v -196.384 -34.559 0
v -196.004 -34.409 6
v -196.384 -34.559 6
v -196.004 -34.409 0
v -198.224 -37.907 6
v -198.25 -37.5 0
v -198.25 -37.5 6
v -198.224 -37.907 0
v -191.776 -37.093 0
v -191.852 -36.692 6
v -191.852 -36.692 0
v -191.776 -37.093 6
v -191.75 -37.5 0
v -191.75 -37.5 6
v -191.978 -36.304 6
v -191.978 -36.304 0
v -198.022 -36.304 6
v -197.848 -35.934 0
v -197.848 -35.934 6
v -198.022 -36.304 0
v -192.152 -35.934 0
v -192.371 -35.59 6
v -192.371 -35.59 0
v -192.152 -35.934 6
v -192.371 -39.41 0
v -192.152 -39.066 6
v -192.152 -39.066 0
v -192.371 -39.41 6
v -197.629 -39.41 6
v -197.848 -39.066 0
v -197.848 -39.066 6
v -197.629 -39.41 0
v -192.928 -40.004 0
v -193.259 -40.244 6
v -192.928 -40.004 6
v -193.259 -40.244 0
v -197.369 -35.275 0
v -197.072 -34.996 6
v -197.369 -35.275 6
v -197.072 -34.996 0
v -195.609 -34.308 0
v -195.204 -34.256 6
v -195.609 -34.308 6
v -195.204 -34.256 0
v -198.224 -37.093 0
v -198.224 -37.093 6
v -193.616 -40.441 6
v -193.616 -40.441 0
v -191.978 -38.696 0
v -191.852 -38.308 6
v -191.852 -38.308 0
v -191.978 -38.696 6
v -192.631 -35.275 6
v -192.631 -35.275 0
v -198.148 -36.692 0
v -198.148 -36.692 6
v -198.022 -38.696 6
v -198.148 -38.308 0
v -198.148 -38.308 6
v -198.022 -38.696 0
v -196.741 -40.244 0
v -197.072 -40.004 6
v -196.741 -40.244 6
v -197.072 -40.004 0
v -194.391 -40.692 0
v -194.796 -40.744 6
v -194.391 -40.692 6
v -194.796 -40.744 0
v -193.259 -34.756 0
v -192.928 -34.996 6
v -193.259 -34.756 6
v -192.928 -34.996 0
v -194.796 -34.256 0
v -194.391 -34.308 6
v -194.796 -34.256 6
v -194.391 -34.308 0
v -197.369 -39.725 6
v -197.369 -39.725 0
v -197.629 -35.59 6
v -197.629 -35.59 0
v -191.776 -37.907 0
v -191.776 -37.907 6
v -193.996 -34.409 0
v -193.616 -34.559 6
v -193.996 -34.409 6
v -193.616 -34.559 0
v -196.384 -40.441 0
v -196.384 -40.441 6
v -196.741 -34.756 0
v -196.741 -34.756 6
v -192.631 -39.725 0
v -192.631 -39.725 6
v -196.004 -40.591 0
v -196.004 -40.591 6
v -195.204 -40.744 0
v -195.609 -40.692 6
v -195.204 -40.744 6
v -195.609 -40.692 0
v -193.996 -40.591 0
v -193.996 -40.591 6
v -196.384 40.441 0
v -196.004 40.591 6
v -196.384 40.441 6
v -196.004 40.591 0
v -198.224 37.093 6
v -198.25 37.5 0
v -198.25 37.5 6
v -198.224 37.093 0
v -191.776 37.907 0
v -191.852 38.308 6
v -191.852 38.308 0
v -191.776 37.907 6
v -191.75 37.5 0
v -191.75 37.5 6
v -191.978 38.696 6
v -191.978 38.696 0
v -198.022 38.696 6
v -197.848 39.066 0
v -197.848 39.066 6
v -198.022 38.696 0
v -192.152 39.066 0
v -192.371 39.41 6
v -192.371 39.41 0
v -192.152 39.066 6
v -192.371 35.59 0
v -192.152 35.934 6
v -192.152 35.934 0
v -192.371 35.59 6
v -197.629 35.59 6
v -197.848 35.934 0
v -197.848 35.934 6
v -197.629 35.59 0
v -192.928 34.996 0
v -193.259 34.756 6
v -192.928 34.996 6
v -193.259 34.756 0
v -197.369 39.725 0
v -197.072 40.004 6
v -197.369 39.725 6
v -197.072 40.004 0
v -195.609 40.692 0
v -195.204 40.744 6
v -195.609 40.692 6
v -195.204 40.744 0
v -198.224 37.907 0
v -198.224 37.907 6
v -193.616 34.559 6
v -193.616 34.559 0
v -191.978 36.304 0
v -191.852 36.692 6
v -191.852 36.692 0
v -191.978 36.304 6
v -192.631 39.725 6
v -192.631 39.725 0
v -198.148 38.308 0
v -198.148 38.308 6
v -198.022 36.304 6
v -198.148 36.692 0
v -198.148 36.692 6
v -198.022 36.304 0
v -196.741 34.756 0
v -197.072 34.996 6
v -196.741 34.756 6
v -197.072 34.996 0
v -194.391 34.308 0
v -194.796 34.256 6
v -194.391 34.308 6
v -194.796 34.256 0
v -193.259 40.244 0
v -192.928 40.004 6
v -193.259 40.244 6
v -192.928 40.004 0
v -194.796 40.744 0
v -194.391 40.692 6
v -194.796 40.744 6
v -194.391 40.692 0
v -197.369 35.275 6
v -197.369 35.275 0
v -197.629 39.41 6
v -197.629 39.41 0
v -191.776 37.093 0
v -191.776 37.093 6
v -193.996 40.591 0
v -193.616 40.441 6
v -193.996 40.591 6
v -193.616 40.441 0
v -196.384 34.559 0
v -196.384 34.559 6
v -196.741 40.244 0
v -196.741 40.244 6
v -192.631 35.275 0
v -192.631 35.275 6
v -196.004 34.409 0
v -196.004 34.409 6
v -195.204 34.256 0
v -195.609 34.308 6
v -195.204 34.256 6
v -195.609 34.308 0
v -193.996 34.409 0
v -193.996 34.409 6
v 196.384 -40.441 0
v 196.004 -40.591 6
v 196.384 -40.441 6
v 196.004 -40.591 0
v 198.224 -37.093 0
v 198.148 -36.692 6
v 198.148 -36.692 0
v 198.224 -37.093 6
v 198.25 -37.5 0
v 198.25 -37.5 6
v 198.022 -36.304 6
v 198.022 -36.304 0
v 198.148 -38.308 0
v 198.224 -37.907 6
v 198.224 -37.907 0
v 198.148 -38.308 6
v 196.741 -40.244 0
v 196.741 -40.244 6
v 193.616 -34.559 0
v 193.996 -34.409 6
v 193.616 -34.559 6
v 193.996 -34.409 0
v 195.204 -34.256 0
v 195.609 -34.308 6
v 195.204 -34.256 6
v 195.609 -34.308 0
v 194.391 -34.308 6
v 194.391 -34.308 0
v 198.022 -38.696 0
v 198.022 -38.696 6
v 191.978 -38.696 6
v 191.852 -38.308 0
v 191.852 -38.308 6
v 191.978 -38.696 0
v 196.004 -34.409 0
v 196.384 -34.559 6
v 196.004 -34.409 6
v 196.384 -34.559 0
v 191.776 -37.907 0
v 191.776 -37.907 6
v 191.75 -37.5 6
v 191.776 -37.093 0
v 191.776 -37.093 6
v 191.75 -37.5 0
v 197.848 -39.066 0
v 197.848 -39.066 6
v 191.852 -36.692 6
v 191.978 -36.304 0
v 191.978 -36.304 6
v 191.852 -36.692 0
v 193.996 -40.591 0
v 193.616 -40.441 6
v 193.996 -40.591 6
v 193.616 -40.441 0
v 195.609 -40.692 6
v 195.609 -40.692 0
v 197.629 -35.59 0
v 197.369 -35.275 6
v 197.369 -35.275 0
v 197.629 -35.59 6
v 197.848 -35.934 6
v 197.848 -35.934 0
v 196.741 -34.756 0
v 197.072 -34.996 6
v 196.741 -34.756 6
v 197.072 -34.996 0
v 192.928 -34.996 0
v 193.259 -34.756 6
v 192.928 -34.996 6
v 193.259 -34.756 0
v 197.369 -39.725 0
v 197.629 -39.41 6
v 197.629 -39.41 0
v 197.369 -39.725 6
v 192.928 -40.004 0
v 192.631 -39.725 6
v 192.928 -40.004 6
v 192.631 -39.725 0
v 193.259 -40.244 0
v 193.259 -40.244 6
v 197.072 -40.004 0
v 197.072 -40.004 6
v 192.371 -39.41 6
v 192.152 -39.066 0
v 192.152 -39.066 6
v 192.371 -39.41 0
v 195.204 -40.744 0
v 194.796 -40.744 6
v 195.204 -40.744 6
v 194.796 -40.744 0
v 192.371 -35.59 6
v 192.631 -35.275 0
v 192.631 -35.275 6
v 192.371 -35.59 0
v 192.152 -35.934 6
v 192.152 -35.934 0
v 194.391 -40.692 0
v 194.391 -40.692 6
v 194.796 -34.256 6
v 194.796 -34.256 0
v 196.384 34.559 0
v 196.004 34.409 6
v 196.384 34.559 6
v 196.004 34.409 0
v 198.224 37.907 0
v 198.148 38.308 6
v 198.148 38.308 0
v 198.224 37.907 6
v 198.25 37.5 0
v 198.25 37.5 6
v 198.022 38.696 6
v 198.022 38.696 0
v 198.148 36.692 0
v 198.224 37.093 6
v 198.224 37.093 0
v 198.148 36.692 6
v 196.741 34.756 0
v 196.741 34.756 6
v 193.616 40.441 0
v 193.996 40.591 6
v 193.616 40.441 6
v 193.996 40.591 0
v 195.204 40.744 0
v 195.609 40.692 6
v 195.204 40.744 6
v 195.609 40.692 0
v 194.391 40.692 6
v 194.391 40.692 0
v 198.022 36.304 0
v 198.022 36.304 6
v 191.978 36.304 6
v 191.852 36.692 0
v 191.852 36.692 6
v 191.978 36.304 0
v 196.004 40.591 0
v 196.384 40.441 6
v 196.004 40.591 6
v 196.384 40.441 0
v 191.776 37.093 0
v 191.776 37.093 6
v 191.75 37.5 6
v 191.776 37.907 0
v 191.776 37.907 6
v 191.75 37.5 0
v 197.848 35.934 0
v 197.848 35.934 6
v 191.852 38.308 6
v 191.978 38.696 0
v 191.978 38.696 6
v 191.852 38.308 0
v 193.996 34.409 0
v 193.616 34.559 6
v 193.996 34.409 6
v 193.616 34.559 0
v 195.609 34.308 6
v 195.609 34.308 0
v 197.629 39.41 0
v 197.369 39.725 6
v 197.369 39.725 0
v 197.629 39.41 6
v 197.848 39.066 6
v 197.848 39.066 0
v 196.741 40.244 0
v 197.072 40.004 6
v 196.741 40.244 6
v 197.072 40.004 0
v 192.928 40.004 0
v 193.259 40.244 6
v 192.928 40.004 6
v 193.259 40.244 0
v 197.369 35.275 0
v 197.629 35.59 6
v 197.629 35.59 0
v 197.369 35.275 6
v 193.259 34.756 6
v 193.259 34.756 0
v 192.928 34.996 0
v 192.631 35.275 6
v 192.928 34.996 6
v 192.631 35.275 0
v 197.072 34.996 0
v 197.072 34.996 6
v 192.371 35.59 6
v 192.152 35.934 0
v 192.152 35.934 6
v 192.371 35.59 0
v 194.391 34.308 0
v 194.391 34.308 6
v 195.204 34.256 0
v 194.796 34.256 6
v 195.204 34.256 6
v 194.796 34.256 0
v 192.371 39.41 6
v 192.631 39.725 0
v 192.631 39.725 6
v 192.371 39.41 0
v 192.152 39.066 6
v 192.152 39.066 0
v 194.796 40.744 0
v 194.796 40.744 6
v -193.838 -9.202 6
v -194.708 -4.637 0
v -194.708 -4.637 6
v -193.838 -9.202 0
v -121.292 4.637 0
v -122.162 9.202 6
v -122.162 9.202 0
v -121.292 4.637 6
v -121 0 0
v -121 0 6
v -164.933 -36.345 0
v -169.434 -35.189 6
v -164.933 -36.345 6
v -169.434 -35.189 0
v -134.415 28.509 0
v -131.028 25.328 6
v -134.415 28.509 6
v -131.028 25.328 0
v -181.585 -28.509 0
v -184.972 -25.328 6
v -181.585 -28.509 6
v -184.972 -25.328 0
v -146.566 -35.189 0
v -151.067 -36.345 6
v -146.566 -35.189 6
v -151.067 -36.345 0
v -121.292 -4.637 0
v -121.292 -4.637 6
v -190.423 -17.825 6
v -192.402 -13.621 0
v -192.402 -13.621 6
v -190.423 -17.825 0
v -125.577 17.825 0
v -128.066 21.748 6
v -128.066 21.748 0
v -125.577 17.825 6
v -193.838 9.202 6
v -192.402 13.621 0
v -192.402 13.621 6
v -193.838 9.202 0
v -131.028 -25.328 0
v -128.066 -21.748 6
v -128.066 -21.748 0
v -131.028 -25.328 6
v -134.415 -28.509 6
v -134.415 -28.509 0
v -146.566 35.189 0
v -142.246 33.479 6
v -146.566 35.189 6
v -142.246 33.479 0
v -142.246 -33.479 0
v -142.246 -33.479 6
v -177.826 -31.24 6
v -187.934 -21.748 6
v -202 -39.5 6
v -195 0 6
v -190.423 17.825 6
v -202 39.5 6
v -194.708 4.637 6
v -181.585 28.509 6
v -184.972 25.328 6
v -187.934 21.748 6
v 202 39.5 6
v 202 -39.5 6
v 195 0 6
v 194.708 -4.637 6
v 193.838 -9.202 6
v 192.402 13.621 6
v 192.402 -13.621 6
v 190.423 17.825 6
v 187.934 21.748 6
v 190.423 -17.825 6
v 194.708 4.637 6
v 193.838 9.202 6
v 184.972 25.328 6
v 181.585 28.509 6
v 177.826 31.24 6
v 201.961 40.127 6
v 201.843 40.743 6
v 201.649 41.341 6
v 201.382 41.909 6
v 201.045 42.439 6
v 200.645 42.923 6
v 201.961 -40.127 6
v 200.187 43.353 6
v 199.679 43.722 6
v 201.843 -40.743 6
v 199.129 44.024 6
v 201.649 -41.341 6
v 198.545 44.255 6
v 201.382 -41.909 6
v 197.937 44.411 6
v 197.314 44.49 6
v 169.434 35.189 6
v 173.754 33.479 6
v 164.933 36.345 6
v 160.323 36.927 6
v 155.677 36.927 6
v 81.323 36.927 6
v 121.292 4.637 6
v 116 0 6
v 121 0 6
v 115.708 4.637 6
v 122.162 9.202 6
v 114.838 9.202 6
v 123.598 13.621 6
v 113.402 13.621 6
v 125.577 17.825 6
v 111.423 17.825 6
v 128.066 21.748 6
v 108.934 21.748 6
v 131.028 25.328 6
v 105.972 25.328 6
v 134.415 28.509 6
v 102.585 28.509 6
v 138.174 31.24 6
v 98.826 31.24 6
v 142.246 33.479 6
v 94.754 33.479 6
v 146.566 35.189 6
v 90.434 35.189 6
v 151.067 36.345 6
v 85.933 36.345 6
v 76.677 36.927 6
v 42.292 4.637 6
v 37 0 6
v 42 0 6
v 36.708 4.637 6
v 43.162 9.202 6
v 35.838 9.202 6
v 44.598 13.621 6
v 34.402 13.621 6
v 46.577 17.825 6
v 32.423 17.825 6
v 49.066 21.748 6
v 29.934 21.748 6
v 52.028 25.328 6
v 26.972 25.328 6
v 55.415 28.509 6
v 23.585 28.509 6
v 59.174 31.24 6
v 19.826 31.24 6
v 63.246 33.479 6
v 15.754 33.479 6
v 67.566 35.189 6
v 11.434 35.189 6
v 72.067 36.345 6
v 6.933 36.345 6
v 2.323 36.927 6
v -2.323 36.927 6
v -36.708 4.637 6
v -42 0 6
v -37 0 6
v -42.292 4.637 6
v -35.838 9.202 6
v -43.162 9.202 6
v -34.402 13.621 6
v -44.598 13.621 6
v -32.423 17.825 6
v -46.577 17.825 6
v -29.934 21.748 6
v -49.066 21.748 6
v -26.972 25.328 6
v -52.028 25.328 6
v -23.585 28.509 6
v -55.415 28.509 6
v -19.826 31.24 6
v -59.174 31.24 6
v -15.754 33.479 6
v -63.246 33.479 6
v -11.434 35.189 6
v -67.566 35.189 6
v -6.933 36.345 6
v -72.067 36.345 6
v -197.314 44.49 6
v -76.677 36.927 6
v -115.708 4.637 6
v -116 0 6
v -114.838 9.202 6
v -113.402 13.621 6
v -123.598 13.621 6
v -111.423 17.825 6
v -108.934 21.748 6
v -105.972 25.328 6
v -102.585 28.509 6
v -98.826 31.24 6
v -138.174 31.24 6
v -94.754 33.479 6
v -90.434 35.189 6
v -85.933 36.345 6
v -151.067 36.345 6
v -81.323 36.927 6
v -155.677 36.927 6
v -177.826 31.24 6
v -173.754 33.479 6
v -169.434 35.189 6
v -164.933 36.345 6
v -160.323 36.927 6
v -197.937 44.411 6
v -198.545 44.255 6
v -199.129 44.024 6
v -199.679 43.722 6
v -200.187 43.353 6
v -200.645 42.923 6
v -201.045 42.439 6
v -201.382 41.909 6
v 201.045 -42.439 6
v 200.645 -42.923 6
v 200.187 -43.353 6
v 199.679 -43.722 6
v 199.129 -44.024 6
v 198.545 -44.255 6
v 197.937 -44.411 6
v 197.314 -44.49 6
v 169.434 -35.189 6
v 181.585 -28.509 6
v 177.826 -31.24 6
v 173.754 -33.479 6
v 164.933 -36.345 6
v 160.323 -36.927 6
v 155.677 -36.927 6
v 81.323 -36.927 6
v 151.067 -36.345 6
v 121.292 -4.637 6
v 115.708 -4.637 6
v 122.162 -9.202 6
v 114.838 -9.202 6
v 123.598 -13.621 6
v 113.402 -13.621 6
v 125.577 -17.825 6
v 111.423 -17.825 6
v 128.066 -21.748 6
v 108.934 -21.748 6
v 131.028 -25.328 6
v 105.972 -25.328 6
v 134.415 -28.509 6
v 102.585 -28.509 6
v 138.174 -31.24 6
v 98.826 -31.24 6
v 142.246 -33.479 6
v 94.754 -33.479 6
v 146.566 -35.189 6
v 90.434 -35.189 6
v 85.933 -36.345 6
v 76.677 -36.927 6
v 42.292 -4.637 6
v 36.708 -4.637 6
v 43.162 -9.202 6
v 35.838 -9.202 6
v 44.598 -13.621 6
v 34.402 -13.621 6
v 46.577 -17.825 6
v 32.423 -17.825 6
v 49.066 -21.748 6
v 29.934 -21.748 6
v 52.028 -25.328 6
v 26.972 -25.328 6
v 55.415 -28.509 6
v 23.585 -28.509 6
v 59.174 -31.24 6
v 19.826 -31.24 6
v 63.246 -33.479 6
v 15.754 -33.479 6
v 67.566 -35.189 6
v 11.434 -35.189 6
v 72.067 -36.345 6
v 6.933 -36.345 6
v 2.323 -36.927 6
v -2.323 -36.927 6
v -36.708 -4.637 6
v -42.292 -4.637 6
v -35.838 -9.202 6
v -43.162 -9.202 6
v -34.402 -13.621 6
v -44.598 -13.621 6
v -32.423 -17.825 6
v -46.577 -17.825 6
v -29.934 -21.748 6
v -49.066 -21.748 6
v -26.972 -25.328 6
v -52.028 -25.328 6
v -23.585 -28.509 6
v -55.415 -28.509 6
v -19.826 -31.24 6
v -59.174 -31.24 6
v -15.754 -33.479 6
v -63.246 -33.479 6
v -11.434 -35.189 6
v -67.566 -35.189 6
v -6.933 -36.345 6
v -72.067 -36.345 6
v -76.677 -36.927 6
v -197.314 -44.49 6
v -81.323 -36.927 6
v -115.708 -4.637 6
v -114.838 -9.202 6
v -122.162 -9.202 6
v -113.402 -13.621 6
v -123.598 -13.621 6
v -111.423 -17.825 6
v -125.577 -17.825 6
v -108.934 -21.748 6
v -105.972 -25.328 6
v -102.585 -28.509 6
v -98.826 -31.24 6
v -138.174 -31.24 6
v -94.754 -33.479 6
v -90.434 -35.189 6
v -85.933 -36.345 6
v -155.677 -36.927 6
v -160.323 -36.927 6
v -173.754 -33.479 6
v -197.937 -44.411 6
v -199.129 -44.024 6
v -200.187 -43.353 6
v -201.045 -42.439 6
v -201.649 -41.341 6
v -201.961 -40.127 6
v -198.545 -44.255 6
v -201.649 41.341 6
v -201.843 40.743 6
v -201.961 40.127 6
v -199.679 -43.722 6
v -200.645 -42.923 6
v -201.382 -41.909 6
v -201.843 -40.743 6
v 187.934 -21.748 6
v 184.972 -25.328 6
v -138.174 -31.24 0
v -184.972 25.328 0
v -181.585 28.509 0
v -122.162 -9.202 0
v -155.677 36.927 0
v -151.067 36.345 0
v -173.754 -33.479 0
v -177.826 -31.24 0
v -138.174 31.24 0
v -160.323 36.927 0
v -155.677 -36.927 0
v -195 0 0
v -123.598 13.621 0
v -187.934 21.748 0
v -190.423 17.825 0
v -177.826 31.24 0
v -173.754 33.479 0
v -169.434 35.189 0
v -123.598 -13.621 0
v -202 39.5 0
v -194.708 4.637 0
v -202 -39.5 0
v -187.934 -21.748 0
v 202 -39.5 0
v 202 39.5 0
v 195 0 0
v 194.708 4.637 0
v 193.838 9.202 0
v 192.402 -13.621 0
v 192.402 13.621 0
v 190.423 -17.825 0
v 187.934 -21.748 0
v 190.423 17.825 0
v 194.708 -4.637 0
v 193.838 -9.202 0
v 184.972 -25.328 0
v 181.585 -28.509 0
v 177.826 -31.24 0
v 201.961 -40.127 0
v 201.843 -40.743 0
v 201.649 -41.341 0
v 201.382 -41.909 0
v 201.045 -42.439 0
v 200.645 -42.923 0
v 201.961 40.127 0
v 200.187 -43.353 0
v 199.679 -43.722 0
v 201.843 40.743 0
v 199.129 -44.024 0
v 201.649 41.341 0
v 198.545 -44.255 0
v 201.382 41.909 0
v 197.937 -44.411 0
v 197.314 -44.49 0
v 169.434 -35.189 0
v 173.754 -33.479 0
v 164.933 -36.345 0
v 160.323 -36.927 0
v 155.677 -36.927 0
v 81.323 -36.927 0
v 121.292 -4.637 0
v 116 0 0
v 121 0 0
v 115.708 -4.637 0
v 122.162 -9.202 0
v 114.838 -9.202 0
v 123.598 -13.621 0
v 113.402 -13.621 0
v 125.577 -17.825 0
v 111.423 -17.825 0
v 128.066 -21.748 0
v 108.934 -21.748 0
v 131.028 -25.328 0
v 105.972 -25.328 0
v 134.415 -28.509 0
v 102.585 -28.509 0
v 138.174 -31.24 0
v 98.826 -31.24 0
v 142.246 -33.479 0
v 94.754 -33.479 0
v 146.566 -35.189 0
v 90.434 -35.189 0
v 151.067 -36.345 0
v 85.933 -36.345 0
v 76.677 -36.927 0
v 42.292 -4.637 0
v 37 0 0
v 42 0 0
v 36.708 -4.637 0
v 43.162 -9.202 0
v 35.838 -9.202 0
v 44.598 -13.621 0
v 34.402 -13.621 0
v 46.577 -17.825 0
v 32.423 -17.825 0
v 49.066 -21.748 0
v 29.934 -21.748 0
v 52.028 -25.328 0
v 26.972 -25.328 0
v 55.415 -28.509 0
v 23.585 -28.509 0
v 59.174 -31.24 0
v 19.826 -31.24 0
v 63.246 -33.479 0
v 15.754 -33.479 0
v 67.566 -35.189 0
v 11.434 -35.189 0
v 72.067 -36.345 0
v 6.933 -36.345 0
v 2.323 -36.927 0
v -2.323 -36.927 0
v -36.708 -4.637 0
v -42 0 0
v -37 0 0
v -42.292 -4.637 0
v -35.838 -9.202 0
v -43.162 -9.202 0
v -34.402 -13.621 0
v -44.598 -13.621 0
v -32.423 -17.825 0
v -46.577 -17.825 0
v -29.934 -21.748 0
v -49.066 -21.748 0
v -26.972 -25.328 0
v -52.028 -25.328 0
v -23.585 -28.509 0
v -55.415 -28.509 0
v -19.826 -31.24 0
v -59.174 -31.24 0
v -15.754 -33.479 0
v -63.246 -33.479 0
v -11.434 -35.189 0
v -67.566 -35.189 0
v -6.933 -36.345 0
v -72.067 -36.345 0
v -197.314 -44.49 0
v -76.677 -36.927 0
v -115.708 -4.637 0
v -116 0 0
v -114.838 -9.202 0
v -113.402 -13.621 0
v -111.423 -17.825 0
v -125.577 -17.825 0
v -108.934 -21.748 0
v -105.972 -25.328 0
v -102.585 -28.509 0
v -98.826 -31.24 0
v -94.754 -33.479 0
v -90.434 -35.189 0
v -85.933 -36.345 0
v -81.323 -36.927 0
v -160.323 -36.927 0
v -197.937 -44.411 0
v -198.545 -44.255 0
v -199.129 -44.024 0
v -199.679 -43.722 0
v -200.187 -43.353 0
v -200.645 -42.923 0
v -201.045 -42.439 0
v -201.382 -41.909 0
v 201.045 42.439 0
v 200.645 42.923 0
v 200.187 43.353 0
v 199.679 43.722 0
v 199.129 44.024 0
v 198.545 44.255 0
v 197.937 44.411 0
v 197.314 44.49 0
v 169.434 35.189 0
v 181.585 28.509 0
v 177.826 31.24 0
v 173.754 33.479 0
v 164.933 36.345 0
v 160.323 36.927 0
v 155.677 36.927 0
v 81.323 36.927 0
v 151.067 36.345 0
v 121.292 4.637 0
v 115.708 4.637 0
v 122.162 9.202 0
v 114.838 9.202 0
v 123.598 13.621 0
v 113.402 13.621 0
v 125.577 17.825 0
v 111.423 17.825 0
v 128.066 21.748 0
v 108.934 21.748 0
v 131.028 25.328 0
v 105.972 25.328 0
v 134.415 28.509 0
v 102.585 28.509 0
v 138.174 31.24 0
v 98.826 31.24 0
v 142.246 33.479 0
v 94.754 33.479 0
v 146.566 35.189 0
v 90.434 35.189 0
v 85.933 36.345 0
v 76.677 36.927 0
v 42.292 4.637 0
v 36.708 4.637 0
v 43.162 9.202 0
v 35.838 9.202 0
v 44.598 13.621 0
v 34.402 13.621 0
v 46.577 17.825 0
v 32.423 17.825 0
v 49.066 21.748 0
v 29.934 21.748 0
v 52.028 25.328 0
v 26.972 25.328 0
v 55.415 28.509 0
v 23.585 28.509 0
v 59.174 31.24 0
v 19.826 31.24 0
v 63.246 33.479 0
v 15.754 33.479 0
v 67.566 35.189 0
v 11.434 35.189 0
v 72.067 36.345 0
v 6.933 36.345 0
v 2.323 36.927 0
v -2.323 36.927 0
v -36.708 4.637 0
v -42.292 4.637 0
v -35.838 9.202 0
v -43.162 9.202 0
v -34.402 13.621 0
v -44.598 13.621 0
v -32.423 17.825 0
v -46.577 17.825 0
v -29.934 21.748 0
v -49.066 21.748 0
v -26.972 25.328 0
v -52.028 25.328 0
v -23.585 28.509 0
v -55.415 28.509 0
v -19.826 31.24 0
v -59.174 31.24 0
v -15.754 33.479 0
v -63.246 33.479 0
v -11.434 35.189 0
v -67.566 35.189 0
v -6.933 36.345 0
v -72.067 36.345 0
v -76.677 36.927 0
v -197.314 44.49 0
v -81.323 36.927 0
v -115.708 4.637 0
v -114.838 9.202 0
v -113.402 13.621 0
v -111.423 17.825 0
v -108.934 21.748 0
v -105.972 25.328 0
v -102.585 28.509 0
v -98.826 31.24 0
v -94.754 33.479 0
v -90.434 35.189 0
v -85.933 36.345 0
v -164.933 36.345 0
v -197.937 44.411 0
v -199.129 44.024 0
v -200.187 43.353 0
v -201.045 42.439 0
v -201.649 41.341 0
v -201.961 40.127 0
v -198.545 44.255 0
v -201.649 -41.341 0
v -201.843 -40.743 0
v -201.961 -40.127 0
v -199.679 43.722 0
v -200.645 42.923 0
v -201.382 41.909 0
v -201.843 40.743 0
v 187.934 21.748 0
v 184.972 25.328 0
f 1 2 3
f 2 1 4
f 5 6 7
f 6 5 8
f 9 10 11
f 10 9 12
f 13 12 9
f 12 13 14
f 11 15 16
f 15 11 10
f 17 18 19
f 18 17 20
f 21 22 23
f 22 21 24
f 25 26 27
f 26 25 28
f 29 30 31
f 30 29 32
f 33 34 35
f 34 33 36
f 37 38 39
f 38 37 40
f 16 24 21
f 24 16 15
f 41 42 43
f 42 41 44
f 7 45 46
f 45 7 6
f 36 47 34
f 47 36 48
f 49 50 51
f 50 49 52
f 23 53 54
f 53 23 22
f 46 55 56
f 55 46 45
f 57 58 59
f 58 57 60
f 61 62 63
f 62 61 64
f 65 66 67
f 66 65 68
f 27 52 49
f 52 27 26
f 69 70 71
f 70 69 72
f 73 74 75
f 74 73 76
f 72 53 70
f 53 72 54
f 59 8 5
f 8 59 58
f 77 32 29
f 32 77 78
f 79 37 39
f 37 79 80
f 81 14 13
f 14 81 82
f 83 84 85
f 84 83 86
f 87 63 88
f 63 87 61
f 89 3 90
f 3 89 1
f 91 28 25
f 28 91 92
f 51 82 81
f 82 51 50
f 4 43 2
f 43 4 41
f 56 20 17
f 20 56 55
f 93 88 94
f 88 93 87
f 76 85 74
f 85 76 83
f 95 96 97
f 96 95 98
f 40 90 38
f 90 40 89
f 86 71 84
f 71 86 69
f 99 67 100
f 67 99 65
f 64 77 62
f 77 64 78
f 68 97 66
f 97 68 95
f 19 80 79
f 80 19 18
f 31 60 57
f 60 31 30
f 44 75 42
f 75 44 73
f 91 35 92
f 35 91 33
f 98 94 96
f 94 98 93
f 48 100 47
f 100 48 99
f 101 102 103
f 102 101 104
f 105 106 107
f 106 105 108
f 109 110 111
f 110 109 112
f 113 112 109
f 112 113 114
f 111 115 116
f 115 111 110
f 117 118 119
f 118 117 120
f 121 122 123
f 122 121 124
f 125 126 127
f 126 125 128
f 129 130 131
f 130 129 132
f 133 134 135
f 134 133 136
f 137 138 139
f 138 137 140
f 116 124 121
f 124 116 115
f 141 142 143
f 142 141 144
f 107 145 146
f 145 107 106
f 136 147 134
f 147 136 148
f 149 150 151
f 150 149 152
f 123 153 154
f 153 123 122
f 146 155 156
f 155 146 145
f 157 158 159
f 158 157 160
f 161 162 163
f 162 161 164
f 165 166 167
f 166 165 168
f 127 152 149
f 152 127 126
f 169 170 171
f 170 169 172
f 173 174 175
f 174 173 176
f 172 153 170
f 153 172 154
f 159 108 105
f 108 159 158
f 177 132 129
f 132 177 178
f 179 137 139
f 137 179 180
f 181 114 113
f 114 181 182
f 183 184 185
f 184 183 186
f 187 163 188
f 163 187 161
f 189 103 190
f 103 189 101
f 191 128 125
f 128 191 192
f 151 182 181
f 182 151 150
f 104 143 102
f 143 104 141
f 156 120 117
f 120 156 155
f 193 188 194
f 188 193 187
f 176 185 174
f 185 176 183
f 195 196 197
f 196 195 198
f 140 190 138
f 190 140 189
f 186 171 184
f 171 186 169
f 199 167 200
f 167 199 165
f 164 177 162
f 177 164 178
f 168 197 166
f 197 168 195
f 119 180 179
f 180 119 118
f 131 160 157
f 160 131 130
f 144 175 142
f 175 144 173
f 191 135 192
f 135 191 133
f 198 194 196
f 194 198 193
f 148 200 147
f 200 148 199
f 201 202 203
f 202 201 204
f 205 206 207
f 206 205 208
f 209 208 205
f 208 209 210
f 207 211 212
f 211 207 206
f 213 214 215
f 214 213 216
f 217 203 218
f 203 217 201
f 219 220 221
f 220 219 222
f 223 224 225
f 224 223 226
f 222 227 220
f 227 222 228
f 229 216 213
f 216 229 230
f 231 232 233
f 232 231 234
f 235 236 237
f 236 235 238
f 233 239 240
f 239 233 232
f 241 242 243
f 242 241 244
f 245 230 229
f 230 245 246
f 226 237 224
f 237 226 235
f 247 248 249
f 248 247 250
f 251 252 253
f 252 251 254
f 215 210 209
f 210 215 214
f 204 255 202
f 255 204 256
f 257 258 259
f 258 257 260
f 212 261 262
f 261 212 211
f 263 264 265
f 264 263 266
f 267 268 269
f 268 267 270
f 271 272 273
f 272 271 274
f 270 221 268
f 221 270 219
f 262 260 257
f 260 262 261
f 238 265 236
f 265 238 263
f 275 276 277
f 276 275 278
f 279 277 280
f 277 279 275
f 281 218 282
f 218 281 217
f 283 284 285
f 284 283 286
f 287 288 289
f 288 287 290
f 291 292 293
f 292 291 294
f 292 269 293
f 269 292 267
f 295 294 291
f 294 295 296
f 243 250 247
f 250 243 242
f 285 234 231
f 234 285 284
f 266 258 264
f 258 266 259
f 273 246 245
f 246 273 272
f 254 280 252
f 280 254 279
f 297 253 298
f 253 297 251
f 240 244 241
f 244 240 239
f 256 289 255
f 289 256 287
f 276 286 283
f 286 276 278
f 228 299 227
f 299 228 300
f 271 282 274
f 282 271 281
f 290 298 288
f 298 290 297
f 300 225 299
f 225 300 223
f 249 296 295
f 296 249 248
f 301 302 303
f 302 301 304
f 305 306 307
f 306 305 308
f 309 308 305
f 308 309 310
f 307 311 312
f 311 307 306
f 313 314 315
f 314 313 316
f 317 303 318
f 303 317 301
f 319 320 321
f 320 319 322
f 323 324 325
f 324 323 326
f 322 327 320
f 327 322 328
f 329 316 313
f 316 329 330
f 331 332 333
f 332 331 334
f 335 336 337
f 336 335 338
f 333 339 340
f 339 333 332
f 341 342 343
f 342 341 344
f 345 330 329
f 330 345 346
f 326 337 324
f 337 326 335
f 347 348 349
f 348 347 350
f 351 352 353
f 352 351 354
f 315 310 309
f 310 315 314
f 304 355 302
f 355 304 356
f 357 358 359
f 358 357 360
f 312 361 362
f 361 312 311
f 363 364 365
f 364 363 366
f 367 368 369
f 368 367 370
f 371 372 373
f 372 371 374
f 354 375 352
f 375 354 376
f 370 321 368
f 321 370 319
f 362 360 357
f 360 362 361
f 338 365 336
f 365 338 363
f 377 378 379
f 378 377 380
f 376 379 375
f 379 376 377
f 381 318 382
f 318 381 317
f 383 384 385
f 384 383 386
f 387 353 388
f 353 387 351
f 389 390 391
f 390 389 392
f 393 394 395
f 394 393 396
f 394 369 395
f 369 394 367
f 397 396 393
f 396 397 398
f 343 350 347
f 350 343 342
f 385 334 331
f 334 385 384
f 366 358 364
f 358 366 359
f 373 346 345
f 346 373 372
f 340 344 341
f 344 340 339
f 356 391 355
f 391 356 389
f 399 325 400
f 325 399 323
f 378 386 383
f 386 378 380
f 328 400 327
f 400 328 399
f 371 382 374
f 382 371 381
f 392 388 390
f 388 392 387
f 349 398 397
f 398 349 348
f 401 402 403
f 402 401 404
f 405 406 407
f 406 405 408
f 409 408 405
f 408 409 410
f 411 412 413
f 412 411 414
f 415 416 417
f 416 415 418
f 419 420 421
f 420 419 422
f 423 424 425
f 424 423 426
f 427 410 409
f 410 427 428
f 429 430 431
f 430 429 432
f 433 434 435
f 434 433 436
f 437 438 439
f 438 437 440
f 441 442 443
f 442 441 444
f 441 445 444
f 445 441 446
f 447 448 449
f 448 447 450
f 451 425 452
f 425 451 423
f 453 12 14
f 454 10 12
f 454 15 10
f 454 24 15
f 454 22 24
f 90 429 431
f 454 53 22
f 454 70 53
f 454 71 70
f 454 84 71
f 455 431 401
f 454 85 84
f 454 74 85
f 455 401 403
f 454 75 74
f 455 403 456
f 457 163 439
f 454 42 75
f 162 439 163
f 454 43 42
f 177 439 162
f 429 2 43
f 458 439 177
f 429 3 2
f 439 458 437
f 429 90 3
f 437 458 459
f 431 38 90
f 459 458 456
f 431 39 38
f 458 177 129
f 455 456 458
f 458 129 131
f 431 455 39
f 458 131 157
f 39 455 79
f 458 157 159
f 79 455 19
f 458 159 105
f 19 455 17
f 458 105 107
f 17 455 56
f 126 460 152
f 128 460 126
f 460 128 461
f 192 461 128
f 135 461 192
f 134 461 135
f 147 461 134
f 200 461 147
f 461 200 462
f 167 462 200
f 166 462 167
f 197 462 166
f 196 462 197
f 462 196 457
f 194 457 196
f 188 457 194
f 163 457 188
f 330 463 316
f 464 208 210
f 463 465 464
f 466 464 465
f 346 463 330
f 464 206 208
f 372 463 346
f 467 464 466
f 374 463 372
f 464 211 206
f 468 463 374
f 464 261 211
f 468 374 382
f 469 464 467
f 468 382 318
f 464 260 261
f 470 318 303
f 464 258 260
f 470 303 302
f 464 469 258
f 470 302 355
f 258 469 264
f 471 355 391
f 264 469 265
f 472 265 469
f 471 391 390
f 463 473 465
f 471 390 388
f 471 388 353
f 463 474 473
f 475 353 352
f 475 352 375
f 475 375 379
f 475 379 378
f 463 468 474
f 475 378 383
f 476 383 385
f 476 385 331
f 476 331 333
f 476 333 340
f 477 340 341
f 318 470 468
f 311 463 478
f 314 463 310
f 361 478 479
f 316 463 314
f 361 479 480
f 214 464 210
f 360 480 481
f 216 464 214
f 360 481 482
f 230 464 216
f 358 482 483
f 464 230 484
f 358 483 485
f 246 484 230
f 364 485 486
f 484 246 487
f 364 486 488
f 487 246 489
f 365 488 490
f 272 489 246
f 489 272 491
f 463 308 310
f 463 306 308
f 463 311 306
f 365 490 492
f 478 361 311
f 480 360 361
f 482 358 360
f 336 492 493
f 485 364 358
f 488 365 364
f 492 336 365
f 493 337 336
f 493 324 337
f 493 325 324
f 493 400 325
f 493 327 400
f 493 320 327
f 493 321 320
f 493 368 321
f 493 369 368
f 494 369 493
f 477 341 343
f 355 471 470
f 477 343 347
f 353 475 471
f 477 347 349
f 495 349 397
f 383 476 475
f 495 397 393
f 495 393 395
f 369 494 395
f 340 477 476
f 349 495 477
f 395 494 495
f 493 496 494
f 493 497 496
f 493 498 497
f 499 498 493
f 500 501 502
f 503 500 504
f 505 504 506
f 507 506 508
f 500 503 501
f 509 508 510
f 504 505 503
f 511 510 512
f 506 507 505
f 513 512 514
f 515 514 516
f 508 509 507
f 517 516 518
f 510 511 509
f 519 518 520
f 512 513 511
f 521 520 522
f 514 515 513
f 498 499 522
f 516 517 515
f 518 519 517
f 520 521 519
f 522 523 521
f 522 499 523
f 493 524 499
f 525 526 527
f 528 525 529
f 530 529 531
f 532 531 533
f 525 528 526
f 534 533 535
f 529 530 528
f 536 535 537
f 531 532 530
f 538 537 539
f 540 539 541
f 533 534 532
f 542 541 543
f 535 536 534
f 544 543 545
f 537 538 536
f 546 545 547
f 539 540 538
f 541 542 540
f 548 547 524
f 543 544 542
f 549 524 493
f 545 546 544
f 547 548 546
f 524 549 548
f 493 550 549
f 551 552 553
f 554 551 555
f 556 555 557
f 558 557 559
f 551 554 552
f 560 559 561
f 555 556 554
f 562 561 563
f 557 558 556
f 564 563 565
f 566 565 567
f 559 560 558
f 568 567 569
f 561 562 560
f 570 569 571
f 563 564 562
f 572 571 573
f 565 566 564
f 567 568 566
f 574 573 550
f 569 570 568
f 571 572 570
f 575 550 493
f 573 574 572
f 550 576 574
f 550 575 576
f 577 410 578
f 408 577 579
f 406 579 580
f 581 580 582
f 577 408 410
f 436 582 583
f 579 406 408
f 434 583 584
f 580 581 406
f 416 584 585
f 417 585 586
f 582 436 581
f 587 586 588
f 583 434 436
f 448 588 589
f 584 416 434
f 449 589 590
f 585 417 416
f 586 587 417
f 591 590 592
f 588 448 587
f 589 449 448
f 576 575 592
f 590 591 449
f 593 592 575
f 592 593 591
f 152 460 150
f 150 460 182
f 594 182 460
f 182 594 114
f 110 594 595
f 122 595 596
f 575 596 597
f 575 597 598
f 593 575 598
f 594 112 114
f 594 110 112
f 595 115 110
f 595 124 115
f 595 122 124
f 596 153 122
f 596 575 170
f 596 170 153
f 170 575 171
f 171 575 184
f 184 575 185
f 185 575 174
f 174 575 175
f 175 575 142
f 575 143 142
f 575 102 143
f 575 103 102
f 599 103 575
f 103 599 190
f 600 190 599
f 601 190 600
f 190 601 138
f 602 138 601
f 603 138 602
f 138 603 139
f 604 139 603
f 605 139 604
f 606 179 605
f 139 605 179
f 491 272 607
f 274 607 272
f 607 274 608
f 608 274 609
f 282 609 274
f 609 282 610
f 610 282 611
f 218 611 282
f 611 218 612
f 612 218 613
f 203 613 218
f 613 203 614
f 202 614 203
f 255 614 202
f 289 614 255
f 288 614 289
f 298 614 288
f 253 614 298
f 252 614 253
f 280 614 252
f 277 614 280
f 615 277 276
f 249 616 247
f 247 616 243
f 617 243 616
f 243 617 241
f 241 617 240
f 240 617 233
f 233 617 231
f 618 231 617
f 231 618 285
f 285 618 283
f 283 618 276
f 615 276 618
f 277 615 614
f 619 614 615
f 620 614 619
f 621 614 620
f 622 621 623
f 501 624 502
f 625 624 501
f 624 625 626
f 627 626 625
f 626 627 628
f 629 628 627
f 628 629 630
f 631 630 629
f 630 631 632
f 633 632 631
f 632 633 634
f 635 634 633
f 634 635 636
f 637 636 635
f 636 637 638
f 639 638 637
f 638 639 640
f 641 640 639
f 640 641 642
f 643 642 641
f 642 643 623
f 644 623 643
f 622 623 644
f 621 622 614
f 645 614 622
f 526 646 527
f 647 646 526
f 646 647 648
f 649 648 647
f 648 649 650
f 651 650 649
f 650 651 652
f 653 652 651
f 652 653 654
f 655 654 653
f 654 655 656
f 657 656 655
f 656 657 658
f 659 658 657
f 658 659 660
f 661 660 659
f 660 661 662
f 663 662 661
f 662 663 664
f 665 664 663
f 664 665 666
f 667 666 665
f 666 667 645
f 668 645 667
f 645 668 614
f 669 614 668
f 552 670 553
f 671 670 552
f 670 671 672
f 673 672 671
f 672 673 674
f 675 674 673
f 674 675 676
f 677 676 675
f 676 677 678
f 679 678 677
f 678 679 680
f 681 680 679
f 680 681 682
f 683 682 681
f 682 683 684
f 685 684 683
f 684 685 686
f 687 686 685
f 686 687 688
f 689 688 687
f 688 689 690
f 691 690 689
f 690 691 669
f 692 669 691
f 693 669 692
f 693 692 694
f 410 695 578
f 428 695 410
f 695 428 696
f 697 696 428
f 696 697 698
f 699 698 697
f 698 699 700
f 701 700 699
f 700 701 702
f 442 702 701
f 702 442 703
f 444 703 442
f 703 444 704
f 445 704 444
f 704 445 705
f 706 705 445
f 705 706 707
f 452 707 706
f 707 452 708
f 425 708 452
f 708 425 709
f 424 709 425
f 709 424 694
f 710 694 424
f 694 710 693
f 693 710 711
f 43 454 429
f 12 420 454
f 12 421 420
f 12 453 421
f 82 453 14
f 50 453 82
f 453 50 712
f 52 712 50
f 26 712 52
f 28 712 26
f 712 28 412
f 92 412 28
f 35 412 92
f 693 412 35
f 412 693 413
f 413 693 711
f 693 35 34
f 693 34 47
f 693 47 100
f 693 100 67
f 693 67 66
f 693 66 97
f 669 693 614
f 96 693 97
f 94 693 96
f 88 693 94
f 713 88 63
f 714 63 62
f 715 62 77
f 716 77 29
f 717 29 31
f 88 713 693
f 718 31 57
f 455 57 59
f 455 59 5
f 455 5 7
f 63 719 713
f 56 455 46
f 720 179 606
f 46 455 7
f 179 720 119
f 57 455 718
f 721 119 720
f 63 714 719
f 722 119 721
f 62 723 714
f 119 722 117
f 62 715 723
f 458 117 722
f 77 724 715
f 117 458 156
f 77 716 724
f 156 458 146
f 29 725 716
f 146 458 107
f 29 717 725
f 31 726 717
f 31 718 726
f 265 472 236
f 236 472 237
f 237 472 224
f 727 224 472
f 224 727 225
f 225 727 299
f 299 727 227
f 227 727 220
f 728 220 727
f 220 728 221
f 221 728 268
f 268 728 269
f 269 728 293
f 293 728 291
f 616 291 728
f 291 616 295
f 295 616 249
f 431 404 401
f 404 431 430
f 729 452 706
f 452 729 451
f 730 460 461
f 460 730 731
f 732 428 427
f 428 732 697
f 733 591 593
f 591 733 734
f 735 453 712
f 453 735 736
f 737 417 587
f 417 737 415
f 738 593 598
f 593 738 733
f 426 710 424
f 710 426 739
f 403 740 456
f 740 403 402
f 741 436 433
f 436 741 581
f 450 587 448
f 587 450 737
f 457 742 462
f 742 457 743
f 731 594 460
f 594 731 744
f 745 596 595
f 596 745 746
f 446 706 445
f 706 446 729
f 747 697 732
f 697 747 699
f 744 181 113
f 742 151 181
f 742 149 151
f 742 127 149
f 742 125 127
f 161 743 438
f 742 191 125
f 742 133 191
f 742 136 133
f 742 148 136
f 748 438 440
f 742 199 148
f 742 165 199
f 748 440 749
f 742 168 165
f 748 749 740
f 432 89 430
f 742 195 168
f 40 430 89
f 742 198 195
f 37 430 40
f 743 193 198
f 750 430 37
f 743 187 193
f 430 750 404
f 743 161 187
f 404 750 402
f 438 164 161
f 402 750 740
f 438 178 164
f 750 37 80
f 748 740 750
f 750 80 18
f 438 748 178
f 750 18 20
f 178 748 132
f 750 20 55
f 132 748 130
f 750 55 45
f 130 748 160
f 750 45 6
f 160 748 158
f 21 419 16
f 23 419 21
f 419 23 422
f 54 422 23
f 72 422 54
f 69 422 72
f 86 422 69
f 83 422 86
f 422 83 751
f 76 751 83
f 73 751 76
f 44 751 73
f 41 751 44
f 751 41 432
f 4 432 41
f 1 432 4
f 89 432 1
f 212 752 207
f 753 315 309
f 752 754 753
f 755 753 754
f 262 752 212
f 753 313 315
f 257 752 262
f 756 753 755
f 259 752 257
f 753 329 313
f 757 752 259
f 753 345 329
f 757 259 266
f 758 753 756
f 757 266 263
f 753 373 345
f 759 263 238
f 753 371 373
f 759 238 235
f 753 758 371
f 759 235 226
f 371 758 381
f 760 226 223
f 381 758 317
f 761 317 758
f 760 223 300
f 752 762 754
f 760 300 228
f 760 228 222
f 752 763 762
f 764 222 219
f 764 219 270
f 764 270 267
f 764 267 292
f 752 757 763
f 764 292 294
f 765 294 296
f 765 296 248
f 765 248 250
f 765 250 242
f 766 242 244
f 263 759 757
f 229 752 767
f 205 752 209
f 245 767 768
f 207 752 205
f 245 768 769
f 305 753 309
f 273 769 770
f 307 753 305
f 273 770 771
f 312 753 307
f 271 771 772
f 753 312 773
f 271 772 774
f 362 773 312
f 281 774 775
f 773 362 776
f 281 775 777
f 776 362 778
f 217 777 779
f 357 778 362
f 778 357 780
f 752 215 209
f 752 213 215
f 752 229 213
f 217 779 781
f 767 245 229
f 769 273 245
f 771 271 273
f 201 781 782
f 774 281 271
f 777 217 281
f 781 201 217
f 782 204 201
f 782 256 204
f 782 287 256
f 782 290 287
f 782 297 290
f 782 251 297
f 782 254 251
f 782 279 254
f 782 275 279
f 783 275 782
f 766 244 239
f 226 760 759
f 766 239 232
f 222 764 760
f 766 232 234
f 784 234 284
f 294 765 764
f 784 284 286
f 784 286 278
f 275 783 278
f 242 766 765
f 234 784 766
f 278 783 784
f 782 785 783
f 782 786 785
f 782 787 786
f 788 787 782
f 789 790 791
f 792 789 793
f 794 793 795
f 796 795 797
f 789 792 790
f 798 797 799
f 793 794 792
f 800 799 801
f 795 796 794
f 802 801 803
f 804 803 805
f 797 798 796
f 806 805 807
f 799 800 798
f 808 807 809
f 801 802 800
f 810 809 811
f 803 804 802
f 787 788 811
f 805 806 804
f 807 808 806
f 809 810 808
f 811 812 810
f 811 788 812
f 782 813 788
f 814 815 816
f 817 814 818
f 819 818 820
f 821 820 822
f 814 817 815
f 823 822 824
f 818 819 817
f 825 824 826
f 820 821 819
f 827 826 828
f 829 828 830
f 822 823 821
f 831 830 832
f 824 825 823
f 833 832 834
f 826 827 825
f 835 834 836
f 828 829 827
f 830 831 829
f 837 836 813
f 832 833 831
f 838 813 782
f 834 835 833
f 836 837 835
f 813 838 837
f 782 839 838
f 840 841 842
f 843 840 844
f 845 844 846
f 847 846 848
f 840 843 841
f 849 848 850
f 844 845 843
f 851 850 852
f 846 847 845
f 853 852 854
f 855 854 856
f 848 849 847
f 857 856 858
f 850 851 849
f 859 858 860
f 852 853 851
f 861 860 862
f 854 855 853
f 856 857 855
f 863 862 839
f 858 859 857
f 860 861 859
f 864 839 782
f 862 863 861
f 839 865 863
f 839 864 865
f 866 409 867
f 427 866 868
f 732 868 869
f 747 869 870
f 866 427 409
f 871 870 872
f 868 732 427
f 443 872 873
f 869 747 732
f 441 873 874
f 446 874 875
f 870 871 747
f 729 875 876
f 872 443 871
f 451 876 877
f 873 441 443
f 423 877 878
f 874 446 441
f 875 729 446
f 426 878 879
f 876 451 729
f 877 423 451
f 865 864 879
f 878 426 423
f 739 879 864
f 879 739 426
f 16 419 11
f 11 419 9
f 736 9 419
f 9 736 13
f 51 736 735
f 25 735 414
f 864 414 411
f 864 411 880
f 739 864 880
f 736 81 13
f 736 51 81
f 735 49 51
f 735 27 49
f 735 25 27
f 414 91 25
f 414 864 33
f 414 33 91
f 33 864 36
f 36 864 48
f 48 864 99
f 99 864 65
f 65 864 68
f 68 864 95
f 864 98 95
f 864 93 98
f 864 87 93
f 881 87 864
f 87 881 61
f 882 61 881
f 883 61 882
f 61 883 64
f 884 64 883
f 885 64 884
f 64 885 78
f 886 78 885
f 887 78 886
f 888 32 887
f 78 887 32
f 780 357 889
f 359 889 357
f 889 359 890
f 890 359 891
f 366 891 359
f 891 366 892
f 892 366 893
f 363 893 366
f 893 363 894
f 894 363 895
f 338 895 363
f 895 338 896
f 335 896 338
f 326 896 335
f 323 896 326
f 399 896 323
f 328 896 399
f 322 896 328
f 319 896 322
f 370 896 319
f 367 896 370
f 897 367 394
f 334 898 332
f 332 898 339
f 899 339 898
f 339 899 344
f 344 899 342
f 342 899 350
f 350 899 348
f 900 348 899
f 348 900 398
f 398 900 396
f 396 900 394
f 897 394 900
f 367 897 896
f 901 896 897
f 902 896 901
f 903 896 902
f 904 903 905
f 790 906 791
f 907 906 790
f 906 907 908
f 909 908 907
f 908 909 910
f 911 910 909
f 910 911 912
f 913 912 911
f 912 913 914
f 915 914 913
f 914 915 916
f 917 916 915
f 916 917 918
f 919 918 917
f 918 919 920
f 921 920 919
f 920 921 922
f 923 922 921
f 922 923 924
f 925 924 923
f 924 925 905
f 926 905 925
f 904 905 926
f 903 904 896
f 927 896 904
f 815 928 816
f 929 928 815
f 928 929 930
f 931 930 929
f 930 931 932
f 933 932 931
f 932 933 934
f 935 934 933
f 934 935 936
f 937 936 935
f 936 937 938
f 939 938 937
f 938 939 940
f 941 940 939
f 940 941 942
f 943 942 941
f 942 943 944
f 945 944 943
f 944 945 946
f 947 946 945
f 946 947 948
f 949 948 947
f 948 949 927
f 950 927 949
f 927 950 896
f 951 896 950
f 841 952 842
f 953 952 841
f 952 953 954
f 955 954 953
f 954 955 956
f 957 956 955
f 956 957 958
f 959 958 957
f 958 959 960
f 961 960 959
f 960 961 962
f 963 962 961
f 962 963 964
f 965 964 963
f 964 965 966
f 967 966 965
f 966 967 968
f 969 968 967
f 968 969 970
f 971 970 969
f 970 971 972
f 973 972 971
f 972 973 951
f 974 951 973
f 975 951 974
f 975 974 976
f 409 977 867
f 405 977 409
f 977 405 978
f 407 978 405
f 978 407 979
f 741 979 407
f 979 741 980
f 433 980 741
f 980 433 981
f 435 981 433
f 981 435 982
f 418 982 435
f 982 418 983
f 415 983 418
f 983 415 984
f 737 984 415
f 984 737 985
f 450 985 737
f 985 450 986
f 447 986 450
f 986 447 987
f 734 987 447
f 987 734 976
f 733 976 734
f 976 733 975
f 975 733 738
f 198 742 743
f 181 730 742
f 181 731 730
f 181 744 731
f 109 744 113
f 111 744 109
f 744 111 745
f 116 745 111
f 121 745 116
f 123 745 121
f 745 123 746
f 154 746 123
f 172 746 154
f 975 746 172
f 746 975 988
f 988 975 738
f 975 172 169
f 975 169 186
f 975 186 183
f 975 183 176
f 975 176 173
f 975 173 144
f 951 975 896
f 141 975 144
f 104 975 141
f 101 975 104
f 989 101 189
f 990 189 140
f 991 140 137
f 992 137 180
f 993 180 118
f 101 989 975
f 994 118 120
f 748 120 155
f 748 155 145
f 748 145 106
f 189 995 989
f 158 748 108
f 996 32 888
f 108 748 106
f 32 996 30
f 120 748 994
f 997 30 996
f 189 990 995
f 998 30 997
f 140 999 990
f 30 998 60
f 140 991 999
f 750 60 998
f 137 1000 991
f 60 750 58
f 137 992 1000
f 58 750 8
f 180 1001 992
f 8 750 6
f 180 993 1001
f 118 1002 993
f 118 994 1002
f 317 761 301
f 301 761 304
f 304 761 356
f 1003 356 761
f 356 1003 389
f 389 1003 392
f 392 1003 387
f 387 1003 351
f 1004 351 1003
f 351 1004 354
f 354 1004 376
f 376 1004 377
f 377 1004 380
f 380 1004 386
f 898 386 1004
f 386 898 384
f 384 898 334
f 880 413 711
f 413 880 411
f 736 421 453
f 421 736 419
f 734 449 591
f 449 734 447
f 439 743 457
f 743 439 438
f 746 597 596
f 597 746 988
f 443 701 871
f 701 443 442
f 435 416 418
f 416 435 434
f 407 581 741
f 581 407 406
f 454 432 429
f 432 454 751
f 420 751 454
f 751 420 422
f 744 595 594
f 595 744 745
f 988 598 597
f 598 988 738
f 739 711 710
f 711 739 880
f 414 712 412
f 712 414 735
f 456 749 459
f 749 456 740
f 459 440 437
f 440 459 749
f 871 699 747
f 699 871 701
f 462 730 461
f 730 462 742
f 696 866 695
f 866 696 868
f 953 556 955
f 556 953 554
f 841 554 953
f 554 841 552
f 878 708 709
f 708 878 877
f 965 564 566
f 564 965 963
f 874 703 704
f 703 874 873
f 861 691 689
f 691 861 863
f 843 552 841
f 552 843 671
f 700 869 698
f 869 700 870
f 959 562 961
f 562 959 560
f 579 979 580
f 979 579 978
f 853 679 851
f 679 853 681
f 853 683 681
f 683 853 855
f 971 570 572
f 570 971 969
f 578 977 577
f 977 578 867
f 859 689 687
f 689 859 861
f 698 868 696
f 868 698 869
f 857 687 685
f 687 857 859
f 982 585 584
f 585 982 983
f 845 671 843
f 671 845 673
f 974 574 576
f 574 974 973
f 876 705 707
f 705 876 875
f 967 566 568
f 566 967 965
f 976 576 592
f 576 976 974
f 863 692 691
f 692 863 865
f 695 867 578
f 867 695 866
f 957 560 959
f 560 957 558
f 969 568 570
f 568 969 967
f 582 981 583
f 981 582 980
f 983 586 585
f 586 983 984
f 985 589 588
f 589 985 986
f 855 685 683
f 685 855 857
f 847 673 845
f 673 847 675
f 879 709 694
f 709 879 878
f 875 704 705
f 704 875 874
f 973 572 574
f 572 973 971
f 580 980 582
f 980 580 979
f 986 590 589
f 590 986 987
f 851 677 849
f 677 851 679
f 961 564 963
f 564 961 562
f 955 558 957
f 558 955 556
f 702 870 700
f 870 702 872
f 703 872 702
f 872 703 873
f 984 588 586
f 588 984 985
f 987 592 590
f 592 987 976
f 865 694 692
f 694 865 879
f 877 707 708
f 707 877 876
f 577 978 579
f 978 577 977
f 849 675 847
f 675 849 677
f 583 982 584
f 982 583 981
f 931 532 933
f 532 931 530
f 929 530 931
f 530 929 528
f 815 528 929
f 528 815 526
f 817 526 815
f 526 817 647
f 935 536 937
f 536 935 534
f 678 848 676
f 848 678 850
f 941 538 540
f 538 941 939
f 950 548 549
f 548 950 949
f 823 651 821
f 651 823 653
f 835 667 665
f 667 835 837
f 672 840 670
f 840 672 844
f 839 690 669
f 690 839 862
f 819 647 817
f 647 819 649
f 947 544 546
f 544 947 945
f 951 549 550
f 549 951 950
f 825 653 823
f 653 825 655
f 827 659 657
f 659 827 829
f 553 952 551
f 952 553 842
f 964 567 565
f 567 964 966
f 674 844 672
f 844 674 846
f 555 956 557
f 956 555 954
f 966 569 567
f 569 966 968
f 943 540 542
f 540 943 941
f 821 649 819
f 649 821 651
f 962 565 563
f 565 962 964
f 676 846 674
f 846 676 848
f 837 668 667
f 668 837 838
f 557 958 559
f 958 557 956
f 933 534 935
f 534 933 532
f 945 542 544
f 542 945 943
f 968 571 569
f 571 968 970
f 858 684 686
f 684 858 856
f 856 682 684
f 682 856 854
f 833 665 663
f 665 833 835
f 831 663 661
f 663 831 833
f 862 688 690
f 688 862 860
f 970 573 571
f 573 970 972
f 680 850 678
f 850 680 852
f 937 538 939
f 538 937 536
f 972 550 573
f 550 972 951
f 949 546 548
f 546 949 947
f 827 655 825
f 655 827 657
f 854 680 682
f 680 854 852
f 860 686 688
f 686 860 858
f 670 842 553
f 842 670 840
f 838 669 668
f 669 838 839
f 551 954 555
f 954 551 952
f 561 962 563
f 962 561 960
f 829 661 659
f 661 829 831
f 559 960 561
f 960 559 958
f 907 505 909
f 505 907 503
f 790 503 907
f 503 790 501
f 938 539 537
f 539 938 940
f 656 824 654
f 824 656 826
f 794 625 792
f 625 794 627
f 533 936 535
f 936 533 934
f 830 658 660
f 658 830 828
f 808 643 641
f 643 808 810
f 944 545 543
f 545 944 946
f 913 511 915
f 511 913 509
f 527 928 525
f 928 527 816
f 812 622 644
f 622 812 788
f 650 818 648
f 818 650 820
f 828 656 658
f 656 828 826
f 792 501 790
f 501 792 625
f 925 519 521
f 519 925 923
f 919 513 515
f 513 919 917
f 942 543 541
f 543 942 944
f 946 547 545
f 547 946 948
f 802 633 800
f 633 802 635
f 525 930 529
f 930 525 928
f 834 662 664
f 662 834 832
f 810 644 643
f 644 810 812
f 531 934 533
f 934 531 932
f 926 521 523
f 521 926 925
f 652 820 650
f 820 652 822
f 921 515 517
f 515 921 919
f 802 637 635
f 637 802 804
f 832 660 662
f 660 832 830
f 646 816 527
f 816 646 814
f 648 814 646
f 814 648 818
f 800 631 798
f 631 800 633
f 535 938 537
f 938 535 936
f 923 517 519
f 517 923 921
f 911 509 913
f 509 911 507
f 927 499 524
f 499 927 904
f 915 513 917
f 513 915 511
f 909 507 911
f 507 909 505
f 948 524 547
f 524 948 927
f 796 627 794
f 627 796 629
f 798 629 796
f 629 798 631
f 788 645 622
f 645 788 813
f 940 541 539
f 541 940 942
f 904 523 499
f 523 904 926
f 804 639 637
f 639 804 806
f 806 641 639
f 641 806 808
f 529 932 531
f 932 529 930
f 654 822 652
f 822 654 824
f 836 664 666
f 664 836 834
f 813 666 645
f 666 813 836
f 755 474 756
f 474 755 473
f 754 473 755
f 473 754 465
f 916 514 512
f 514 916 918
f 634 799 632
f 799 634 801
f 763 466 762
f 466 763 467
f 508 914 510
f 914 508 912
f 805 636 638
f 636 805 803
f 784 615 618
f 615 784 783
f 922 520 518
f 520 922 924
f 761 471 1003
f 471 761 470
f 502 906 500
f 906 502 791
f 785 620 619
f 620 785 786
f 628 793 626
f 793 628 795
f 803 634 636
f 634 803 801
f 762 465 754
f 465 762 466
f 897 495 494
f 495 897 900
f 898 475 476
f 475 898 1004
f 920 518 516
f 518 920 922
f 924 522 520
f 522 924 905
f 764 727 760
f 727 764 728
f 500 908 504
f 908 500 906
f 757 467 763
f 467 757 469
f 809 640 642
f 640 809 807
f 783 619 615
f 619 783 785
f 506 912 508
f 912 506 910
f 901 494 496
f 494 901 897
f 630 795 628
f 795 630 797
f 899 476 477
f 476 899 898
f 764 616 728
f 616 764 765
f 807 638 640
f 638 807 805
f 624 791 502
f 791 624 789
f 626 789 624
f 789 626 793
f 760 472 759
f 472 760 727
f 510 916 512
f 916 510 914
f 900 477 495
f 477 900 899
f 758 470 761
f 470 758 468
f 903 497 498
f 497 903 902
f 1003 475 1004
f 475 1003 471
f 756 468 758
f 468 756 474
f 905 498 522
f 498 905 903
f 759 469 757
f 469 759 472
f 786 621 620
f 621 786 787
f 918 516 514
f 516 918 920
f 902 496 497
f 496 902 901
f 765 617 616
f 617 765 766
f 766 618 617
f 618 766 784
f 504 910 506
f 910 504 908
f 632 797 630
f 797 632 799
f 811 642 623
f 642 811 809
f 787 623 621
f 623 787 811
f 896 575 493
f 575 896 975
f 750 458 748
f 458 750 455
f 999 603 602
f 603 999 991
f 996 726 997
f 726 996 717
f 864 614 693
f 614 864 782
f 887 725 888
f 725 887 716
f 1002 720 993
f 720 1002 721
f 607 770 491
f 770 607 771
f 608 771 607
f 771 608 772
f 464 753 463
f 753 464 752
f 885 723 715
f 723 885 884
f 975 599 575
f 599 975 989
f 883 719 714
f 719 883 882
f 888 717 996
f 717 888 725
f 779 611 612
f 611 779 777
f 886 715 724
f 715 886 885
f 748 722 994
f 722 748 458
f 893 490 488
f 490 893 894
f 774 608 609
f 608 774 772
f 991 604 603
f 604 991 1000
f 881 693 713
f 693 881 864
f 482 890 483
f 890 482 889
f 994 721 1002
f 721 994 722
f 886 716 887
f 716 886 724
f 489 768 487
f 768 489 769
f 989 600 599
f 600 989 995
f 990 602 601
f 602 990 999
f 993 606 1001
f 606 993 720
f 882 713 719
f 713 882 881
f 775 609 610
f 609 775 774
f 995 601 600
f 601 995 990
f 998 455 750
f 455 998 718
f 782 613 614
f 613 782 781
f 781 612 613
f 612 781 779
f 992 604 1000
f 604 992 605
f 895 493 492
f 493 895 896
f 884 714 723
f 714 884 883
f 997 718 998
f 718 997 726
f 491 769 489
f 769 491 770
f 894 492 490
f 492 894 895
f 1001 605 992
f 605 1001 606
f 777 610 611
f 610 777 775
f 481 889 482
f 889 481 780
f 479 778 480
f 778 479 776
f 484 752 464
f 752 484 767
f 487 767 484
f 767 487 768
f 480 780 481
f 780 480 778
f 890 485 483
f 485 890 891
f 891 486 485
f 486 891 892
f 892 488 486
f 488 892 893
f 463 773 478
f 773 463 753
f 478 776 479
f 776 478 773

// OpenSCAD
$fn = 50;


difference() {
	union() {
		hull() {
			translate(v = [-197.0000000000, 39.5000000000, 0]) {
				cylinder(h = 6, r = 5);
			}
			translate(v = [197.0000000000, 39.5000000000, 0]) {
				cylinder(h = 6, r = 5);
			}
			translate(v = [-197.0000000000, -39.5000000000, 0]) {
				cylinder(h = 6, r = 5);
			}
			translate(v = [197.0000000000, -39.5000000000, 0]) {
				cylinder(h = 6, r = 5);
			}
		}
	}
	union() {
		#translate(v = [-195.0000000000, -37.5000000000, -100.0000000000]) {
			cylinder(h = 200, r = 3.2500000000);
		}
		#translate(v = [-195.0000000000, 37.5000000000, -100.0000000000]) {
			cylinder(h = 200, r = 3.2500000000);
		}
		#translate(v = [195.0000000000, -37.5000000000, -100.0000000000]) {
			cylinder(h = 200, r = 3.2500000000);
		}
		#translate(v = [195.0000000000, 37.5000000000, -100.0000000000]) {
			cylinder(h = 200, r = 3.2500000000);
		}
		#translate(v = [-158.0000000000, 0, 0]) {
			cylinder(h = 6, r = 37.0000000000);
		}
		#translate(v = [-79.0000000000, 0, 0]) {
			cylinder(h = 6, r = 37.0000000000);
		}
		#cylinder(h = 6, r = 37.0000000000);
		#translate(v = [79.0000000000, 0, 0]) {
			cylinder(h = 6, r = 37.0000000000);
		}
		#translate(v = [158.0000000000, 0, 0]) {
			cylinder(h = 6, r = 37.0000000000);
		}
	}
}
